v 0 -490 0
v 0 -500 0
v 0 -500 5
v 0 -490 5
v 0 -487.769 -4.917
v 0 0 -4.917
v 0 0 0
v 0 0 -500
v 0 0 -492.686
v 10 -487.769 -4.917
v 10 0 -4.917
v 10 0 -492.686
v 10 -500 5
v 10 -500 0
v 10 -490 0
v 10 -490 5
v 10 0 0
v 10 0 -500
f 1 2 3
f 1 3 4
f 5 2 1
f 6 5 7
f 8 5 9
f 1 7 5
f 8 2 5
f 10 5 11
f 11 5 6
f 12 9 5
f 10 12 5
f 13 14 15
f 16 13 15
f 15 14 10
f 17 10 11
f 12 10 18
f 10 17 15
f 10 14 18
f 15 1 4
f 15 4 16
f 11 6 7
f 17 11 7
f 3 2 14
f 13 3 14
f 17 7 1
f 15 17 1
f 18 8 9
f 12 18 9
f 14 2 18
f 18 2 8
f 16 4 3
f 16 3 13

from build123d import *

# Parameters (mm, degrees)
F1_DEPTH = 10
F2_W     = 10
F2_H     = 10
F3_DEPTH = 5


with BuildPart() as f1:
    # F0 (on Right) → F1 (new body)
    with BuildSketch(Plane.YZ):
        Polygon((0, -4.91692), (0, 0), (-500, 0), (0, -500), (0, -492.686017), (-487.769097, -4.91692), align=None)
    extrude(amount=F1_DEPTH)

    # F2 (on face) → F3 (join)
    with BuildSketch(Plane.XY):
        with Locations((5, -495)):
            Rectangle(F2_W, F2_H)
    extrude(amount=F3_DEPTH)


solid = f1.part
